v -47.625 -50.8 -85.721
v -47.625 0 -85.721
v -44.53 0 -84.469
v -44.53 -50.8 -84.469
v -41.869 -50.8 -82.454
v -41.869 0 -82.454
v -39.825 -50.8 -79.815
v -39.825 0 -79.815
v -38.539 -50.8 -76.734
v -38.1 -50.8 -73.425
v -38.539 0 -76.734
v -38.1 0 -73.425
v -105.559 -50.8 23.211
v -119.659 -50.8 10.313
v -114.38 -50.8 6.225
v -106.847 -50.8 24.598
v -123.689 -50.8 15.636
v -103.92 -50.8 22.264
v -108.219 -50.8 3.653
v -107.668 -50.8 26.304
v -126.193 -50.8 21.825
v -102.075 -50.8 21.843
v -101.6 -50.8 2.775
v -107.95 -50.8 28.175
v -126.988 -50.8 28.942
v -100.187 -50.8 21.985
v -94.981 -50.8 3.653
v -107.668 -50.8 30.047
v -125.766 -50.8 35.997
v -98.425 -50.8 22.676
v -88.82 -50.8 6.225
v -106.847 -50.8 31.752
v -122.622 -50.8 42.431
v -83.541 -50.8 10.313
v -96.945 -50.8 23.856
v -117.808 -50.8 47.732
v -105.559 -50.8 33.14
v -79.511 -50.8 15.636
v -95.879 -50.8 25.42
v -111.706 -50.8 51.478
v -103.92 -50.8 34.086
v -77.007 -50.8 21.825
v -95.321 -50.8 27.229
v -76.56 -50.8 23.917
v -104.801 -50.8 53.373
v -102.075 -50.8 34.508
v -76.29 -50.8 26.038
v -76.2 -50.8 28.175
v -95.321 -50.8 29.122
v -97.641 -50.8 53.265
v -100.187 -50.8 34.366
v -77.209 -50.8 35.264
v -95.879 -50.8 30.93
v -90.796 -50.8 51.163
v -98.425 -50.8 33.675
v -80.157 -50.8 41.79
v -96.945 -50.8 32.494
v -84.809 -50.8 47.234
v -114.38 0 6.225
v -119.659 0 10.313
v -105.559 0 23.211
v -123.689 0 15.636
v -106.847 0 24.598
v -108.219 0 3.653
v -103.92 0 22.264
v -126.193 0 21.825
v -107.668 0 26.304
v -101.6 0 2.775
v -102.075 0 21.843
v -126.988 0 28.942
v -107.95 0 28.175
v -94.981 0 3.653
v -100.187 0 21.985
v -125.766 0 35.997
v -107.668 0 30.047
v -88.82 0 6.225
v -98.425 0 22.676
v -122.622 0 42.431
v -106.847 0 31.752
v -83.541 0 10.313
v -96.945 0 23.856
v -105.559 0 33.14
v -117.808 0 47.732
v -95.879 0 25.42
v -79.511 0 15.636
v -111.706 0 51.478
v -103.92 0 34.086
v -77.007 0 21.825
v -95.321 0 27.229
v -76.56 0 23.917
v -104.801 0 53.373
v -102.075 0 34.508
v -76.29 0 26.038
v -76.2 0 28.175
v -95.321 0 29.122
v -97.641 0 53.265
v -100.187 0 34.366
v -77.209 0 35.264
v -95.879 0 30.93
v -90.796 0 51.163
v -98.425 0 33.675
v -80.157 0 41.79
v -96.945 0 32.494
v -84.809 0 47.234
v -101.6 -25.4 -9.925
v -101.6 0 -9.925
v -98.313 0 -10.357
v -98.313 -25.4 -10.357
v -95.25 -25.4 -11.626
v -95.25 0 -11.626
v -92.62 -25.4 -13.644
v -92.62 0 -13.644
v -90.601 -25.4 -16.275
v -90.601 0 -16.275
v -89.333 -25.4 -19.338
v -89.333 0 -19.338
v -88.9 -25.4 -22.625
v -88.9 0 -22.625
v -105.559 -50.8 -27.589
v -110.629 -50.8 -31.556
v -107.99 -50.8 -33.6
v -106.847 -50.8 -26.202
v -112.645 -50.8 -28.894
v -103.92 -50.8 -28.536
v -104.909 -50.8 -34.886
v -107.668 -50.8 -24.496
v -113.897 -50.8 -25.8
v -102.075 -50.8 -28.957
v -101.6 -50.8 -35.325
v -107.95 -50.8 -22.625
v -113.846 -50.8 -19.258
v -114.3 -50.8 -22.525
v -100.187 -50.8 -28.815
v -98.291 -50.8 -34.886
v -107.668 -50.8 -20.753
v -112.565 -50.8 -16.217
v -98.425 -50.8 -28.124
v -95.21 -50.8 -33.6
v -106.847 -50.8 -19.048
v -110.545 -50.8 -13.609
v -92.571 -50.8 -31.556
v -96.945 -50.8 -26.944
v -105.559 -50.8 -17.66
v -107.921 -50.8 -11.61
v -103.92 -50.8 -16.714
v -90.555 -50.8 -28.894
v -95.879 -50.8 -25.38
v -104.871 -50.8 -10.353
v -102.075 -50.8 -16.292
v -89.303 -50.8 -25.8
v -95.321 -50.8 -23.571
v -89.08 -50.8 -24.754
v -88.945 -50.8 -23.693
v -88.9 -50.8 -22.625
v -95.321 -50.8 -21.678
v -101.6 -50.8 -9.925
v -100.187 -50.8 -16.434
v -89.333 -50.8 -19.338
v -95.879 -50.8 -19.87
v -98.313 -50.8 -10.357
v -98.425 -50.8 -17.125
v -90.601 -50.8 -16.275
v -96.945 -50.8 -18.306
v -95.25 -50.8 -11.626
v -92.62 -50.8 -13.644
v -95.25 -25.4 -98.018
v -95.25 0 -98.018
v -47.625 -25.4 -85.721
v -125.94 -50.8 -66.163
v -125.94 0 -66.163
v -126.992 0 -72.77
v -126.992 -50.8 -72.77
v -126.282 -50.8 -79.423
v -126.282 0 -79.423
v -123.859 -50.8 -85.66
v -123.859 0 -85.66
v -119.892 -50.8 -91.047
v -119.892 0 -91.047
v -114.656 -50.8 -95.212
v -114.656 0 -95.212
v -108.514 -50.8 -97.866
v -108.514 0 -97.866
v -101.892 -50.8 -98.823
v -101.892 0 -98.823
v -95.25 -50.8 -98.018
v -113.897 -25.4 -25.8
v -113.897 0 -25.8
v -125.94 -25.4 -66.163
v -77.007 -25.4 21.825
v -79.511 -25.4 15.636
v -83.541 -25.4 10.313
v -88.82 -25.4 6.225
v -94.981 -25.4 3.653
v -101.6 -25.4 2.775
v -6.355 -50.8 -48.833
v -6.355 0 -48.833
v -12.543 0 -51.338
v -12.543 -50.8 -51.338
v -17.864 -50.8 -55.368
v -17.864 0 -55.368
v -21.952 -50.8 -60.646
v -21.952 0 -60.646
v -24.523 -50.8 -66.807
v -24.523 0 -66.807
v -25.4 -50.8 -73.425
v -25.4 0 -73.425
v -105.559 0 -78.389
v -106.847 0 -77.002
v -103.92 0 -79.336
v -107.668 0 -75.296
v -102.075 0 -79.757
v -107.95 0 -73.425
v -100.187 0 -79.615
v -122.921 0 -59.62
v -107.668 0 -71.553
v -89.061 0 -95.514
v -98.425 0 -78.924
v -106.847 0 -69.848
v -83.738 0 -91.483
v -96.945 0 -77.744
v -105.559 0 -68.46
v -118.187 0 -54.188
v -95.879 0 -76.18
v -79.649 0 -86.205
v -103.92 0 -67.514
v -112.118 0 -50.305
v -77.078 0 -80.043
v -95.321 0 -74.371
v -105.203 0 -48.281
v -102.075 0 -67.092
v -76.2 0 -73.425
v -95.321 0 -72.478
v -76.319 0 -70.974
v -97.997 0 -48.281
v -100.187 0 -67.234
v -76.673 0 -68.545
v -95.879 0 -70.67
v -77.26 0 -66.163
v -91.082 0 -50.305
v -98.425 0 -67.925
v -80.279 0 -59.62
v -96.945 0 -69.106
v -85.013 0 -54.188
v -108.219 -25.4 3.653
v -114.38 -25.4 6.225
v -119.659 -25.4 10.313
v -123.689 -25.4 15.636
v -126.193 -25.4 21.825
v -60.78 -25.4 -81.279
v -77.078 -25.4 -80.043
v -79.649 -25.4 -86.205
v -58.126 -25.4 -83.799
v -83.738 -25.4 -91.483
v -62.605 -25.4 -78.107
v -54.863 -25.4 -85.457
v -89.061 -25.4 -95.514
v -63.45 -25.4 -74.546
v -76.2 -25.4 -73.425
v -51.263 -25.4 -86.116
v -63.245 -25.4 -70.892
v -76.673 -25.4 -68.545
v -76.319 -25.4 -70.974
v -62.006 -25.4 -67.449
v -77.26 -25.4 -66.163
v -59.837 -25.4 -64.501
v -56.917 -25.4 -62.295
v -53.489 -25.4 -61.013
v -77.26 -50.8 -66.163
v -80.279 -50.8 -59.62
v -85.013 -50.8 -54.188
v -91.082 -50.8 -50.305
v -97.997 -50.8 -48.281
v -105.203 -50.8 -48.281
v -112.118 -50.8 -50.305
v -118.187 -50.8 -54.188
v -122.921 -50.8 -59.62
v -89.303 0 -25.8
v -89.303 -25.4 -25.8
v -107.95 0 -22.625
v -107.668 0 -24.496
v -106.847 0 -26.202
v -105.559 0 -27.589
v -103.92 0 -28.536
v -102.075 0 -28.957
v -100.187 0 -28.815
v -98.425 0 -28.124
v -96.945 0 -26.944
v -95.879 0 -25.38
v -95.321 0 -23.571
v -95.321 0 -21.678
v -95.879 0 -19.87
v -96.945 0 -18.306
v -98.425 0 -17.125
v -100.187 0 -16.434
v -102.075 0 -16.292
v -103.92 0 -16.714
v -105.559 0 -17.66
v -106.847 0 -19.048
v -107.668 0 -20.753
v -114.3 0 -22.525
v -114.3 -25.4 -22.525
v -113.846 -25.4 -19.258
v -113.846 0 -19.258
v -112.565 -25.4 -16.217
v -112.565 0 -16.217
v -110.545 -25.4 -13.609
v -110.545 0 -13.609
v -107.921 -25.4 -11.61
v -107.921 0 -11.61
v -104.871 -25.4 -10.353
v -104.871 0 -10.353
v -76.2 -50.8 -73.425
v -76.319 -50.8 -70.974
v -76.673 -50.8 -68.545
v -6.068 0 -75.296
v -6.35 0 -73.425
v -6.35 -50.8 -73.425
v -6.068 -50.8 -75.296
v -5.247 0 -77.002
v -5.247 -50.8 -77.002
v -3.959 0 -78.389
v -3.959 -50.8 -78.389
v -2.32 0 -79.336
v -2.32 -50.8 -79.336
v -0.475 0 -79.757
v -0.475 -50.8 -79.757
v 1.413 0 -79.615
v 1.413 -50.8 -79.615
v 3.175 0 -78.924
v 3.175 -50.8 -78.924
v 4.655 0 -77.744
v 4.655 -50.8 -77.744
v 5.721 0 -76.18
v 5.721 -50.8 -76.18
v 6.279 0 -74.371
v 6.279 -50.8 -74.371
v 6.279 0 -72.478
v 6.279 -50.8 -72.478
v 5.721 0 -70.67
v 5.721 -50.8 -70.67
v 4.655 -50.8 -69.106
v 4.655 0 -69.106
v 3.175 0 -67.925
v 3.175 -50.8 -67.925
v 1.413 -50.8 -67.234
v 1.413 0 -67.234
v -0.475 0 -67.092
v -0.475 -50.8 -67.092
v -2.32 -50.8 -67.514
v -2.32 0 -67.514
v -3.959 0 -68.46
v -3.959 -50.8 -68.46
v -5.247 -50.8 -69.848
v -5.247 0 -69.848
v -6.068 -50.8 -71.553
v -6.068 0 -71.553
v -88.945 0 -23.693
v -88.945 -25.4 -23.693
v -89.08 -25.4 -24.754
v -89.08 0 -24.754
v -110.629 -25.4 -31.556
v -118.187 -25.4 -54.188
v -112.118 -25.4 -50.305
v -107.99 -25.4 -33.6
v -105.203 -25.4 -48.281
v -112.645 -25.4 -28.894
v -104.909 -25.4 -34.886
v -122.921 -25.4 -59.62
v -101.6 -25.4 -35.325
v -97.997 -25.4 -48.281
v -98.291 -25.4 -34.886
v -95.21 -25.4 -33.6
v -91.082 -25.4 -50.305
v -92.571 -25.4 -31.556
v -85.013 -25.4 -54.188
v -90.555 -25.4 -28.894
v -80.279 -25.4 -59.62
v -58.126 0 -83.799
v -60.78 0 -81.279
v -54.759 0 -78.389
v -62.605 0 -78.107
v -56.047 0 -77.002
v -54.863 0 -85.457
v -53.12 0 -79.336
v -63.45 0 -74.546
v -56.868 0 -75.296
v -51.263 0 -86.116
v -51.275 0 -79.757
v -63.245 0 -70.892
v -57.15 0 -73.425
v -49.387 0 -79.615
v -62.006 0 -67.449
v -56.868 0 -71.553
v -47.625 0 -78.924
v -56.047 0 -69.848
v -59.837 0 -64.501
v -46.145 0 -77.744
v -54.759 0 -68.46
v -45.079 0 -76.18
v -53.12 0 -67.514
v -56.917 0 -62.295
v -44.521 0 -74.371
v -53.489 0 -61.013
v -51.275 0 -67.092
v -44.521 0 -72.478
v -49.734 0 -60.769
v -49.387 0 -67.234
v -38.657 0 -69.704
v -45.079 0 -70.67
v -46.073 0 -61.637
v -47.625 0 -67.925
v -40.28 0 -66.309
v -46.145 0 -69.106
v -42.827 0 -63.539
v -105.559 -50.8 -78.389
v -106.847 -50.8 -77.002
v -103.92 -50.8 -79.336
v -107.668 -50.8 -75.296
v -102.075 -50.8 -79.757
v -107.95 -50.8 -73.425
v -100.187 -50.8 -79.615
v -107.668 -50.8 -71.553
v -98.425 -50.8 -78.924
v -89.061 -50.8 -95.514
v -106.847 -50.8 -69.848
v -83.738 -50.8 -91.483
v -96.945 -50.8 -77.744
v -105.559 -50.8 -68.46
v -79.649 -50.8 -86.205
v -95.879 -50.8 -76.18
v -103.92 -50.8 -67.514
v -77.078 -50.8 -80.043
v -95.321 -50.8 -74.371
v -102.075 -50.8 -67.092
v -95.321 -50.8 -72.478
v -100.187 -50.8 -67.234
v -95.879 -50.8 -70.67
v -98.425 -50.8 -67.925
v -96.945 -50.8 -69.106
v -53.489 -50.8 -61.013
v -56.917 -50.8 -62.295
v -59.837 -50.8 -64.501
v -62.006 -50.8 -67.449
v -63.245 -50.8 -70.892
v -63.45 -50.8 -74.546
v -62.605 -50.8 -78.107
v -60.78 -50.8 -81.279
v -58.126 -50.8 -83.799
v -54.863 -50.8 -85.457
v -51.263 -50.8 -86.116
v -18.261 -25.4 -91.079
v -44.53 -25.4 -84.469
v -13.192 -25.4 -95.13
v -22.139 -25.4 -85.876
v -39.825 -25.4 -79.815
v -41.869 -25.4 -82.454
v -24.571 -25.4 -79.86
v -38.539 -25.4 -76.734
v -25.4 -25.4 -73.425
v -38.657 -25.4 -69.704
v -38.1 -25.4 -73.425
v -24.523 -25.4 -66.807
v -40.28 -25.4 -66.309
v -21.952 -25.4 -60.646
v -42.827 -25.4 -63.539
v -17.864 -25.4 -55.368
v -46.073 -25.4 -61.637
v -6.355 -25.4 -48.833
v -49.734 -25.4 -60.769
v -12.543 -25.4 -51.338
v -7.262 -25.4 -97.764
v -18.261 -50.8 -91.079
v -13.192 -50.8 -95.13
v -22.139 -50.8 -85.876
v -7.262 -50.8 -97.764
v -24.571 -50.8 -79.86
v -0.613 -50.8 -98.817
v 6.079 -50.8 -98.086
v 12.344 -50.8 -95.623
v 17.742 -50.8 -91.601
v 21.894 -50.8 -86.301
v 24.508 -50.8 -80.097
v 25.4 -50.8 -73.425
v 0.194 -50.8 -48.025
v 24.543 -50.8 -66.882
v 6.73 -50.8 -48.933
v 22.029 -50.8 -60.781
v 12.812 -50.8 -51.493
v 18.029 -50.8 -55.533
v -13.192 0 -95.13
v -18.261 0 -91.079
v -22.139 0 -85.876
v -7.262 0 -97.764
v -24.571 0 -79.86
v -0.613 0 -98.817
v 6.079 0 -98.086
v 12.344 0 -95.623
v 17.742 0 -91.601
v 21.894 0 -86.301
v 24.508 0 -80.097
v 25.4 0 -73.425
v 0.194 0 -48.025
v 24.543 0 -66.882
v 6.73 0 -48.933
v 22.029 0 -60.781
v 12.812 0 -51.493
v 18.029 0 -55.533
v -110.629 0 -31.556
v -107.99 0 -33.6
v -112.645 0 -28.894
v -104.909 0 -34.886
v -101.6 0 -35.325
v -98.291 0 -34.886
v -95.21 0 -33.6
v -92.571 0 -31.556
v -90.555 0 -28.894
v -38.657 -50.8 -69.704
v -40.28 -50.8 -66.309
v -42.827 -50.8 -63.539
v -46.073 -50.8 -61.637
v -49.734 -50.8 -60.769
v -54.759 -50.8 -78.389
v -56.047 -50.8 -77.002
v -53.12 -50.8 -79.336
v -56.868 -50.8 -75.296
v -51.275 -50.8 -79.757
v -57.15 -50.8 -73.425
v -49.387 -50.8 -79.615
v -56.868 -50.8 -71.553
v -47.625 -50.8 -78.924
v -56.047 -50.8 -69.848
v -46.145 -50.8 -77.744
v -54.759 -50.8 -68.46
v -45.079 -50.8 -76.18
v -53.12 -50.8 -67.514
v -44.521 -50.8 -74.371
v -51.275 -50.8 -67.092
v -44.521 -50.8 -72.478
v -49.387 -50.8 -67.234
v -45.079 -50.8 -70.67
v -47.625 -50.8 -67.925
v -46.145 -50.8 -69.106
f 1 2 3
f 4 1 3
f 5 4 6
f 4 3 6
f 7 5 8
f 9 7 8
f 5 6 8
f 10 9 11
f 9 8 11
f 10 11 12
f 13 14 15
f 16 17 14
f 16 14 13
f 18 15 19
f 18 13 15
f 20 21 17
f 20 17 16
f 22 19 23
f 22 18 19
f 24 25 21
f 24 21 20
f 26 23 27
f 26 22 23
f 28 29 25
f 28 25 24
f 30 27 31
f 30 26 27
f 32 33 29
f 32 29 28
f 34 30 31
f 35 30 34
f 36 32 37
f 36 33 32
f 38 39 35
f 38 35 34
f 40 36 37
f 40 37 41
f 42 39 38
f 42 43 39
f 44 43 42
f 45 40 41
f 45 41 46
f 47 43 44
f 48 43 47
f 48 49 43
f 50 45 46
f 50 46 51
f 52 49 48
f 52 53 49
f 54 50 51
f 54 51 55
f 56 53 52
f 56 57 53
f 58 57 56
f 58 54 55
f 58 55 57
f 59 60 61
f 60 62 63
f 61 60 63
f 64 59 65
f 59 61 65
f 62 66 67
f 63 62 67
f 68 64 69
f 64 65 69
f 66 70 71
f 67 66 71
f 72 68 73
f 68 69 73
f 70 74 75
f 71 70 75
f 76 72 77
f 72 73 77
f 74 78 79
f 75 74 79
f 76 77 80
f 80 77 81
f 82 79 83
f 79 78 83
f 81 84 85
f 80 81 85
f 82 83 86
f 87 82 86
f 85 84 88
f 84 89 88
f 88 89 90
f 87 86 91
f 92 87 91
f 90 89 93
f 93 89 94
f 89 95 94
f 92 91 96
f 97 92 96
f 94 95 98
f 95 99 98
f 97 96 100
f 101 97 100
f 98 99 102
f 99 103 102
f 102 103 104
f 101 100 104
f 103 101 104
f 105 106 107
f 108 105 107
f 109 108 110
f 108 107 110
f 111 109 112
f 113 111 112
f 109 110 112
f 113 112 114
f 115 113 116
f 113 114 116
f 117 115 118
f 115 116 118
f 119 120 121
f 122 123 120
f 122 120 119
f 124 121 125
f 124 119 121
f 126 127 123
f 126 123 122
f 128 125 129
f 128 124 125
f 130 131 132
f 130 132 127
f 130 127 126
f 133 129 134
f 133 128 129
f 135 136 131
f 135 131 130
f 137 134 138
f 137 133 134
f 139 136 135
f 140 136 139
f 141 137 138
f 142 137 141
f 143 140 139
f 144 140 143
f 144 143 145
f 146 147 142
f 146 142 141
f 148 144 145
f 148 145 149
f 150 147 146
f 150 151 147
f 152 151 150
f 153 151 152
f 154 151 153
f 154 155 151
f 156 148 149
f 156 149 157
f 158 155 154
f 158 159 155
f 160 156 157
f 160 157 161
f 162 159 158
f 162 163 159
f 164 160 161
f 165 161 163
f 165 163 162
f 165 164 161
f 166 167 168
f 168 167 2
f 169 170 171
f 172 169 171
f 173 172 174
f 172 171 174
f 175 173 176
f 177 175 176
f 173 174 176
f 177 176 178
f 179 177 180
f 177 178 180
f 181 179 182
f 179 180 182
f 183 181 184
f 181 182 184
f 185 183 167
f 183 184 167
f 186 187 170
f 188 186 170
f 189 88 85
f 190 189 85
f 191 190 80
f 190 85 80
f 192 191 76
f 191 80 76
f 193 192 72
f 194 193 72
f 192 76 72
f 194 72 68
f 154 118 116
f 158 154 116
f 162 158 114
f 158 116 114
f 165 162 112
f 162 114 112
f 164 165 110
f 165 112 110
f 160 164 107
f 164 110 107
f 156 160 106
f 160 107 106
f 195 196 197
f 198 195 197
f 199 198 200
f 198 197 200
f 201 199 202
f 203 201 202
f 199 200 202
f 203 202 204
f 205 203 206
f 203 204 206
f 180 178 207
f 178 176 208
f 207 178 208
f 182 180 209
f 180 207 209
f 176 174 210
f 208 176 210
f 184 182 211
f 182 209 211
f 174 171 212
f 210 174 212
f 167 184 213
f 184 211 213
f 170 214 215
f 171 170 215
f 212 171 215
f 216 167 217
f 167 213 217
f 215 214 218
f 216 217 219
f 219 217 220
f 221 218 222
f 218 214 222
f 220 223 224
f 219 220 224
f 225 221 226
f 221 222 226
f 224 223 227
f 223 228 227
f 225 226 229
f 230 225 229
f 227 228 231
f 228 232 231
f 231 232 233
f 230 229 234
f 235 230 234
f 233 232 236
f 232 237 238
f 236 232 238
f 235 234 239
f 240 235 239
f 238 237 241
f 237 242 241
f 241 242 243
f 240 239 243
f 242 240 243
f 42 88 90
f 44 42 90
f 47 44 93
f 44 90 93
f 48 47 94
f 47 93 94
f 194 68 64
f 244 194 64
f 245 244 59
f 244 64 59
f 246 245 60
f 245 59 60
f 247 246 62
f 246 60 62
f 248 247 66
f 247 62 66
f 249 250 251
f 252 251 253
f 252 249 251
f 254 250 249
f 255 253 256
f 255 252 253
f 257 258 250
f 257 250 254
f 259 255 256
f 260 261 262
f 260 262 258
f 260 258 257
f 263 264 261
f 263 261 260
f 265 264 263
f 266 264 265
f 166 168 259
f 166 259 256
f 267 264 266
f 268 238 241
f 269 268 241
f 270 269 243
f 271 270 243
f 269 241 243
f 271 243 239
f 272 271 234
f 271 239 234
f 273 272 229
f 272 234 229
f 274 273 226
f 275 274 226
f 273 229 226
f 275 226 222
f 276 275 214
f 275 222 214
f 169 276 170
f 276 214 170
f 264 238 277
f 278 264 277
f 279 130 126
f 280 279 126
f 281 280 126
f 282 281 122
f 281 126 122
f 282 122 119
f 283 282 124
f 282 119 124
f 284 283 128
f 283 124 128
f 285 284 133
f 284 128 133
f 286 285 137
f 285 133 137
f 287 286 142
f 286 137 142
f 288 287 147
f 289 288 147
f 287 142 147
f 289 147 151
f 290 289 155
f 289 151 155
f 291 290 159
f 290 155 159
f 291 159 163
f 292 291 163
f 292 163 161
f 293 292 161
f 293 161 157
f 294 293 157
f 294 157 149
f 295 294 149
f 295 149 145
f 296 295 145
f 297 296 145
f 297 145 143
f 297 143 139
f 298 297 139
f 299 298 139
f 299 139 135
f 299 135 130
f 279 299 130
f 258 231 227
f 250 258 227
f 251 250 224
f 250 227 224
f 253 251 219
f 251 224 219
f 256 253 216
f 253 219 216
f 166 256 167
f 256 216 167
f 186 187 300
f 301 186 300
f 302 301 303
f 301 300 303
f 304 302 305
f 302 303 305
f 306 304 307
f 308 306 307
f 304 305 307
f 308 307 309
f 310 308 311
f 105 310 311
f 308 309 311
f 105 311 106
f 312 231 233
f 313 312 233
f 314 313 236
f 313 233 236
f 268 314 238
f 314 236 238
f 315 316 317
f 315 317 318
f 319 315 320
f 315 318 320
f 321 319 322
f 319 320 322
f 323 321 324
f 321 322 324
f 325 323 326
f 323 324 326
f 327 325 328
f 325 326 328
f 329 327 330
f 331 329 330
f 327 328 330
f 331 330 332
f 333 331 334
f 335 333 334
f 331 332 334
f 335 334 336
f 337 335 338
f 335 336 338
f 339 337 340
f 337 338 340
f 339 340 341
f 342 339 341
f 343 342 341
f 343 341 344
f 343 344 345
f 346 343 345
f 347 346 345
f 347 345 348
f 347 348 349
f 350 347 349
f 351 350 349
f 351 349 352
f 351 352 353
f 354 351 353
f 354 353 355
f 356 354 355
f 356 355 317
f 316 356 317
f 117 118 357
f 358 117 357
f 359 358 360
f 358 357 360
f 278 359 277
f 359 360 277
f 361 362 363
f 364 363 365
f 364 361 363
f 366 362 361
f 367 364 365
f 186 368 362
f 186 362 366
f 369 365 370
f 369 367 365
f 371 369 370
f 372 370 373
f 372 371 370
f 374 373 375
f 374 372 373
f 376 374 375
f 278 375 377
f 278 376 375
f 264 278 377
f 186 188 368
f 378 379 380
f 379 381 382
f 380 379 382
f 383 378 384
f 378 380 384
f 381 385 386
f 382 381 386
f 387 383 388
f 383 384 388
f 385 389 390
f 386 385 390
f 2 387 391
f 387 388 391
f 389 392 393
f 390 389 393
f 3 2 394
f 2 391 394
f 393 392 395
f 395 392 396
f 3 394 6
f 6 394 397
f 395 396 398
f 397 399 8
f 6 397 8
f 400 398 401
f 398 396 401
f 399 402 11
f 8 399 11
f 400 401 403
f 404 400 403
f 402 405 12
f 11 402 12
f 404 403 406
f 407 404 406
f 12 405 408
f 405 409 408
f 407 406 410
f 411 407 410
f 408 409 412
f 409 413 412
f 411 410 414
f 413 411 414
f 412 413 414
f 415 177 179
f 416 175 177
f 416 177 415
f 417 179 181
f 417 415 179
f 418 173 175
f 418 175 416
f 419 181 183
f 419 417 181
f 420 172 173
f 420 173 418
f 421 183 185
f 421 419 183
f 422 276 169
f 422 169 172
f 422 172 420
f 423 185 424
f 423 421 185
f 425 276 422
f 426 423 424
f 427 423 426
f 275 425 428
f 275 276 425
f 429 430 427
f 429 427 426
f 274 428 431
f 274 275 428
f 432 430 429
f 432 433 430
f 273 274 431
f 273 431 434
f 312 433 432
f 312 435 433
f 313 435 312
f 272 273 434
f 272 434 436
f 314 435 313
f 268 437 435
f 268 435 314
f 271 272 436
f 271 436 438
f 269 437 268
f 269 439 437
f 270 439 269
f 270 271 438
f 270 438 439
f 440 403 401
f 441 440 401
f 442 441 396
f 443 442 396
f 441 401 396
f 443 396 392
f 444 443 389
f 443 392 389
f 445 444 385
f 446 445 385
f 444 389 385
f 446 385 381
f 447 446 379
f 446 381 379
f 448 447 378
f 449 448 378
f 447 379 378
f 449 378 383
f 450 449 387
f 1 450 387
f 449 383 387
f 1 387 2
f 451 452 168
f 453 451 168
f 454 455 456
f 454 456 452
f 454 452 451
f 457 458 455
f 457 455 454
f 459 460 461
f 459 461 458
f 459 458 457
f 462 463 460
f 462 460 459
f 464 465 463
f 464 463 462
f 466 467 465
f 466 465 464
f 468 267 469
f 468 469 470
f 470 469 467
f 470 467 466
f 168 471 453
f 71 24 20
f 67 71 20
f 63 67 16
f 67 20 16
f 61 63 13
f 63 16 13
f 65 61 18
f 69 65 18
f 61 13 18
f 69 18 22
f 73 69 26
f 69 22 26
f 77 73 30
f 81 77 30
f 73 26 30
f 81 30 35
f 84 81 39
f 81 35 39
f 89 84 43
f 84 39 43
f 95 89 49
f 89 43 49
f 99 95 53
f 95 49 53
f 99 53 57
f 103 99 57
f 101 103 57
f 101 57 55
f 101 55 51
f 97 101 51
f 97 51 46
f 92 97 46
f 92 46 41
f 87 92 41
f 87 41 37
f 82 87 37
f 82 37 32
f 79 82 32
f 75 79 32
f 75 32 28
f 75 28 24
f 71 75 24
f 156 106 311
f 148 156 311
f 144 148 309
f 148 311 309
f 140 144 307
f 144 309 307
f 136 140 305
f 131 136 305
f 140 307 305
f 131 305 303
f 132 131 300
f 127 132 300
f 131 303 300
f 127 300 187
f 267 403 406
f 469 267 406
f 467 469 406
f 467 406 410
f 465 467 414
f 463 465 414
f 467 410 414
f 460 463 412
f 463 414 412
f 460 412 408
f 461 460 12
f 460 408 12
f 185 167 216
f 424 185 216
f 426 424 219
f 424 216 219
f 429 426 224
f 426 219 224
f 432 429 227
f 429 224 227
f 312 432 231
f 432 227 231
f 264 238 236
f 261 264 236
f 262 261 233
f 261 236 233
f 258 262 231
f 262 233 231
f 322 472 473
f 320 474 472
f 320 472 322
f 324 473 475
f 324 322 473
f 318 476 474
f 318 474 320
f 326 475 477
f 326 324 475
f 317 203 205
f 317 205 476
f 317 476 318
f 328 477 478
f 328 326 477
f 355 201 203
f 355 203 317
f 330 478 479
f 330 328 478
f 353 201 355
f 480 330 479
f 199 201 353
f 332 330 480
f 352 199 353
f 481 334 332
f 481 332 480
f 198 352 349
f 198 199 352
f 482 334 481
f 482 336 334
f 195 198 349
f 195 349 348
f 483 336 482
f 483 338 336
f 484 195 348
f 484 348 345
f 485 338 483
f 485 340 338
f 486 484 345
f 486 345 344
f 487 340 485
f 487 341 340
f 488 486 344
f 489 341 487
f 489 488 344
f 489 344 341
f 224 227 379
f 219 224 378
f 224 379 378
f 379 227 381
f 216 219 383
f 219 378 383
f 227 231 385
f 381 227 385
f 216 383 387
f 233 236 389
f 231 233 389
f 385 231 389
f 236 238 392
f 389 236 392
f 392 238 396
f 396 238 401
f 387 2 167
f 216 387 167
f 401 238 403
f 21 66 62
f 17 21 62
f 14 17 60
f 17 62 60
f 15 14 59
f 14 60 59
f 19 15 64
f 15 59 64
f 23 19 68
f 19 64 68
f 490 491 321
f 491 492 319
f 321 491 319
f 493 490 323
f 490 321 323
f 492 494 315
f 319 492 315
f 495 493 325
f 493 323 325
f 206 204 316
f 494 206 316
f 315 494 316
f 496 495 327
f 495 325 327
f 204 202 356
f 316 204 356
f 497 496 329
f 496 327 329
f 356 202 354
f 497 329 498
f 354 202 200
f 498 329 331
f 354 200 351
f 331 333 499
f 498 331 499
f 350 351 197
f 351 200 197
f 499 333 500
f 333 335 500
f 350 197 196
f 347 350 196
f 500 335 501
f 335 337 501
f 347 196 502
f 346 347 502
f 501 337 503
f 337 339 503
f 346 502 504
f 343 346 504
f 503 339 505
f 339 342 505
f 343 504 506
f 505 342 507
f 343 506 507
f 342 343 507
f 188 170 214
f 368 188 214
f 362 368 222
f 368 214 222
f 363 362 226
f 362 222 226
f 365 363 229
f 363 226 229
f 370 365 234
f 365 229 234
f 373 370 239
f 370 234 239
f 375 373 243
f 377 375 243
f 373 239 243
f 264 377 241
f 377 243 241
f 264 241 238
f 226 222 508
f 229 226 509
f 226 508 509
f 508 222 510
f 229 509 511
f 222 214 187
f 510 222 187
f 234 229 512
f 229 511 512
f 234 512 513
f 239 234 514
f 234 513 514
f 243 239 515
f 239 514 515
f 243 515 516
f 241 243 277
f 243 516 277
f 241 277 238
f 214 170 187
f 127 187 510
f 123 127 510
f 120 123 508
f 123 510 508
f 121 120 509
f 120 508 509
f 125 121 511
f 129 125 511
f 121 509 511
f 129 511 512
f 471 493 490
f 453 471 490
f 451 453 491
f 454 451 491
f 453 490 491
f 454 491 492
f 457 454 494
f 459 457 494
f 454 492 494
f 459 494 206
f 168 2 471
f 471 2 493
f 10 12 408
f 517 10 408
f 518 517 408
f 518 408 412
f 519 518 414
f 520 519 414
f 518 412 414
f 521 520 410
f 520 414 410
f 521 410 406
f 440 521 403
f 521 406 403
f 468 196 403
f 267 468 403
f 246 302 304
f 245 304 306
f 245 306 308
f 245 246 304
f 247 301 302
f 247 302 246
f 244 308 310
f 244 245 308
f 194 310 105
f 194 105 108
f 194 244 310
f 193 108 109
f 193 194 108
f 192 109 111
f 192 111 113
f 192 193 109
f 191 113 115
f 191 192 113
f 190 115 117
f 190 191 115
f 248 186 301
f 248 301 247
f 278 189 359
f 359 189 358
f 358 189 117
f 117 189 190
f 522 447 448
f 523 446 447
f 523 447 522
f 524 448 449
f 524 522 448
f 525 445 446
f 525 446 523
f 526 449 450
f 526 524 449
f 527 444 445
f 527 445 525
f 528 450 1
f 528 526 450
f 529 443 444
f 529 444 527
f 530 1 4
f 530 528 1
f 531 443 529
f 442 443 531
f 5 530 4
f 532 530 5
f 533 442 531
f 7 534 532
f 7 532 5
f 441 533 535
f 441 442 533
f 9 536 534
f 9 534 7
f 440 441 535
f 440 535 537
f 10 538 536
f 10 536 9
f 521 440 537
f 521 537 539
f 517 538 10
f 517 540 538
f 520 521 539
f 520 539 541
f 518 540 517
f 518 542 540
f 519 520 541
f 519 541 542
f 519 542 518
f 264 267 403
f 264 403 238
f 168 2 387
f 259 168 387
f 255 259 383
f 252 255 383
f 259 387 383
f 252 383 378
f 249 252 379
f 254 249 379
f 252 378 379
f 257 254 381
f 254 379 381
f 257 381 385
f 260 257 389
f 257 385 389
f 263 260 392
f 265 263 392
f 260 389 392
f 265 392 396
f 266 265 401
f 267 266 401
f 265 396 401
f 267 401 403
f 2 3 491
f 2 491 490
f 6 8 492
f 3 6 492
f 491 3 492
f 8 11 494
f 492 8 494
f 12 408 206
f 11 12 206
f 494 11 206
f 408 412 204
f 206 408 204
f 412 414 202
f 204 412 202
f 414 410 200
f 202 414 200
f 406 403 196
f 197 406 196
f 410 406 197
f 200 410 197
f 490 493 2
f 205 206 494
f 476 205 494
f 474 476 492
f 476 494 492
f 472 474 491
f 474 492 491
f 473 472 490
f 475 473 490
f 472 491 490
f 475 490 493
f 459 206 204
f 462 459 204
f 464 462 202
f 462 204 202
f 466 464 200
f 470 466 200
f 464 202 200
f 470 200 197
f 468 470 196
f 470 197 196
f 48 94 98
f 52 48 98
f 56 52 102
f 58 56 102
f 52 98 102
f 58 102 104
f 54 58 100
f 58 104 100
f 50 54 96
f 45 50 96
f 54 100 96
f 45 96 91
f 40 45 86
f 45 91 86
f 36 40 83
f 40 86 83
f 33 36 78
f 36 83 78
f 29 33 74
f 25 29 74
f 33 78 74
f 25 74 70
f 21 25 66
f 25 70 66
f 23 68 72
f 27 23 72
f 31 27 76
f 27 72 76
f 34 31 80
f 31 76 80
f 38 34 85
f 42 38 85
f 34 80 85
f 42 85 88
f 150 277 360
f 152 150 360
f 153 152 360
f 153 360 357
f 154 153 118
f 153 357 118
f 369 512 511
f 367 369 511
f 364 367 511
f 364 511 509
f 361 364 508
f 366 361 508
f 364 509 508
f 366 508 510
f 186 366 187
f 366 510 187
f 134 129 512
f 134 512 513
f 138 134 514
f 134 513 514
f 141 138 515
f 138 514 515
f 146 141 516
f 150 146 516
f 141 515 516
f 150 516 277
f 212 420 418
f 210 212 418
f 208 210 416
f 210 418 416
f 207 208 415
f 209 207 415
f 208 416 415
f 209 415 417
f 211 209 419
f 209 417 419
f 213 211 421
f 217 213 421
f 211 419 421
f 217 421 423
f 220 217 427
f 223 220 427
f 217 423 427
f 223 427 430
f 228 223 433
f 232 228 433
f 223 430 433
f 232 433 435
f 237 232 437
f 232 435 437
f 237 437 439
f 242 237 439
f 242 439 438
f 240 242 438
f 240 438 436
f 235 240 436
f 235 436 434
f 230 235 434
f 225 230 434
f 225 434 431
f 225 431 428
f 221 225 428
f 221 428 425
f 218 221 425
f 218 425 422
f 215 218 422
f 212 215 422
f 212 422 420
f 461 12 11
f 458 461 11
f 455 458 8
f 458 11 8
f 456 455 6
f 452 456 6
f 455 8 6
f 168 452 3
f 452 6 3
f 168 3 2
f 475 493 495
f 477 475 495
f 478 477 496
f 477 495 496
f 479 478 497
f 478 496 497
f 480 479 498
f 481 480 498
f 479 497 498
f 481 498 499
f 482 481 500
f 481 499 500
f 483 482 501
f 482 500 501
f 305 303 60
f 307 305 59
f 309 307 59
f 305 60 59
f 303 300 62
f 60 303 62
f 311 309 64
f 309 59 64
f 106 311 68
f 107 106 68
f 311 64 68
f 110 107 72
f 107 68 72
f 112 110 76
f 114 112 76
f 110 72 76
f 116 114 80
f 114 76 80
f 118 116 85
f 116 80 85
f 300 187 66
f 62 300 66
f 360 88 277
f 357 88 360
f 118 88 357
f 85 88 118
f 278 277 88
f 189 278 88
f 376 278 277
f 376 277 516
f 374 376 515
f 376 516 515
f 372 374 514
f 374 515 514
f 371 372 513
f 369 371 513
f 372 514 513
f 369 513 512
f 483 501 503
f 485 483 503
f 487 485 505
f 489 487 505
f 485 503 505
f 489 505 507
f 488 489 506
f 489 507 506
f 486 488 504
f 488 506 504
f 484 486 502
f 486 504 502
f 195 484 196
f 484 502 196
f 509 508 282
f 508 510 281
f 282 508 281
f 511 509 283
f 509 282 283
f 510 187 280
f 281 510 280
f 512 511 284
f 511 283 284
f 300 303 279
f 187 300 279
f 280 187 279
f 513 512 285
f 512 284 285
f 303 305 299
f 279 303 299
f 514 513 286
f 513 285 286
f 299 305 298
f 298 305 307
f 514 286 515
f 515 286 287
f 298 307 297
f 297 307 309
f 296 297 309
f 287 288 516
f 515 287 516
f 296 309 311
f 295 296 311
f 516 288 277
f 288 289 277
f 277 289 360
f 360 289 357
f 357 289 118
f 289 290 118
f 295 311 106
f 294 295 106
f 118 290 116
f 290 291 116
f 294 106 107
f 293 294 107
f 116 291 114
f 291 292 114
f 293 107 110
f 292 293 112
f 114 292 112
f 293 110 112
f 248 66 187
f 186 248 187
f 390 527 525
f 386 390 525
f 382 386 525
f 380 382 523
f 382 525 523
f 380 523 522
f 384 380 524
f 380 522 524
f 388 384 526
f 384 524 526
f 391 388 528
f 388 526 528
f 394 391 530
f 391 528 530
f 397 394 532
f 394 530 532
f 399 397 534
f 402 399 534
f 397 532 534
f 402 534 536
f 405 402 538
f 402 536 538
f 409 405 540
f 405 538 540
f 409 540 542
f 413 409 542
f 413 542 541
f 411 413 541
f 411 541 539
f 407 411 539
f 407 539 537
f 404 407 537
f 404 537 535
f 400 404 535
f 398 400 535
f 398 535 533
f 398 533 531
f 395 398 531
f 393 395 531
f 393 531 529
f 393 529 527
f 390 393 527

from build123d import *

# Parameters (mm, degrees)
F1_DEPTH = 50.8
F2_DEPTH = 25.4
F3_D     = 12.7
F3_2_D   = 12.7
F3_3_D   = 12.7
F3_4_D   = 12.7
F3_5_D   = 12.7


with BuildPart() as f1:
    # F0 (on Front) → F1 (new body)
    with BuildSketch(Plane.XZ):
        with BuildLine():
            ThreePointArc((-101.6, 2.7753140884), (-86.0457401333, 8.0948509463), (-77.0065557516, 21.8253140884))
            ThreePointArc((-77.0065557516, 21.8253140884), (-76.4024457148, 24.9748050593), (-76.2, 28.1753140884))
            ThreePointArc((-76.2, 28.1753140884), (-104.8005090291, 53.3728683735), (-126.1934442484, 21.8253140884))
            ThreePointArc((-126.1934442484, 21.8253140884), (-117.1542598667, 8.0948509463), (-101.6, 2.7753140884))
        make_face()
    extrude(amount=F1_DEPTH)

    # F3 (through all)
    with Locations(Plane(origin=(0, 0, 0), x_dir=(1, 0, 0), z_dir=(0, 1, 0))):
        with Locations((-101.6, -28.1753140884), (-101.6, 22.6246859116), (-101.6, 73.4246859116), (-50.8, 73.4246859116), (0, 73.4246859116)):
            Hole(F3_D / 2)


with BuildPart() as f1b:
    # F0 (on Front) → F1, piece 2 (new body)
    with BuildSketch(Plane.XZ):
        with BuildLine():
            Line((-101.6, -22.6246859116), (-101.6, -35.3246859116))
            ThreePointArc((-101.6, -35.3246859116), (-93.8228700667, -32.6649174827), (-89.3032778758, -25.7996859116))
            ThreePointArc((-89.3032778758, -25.7996859116), (-89.0012228574, -24.2249404262), (-88.9, -22.6246859116))
            ThreePointArc((-88.9, -22.6246859116), (-92.6197438789, -13.6444297906), (-101.6, -9.9246859116))
            Line((-101.6, -9.9246859116), (-101.6, -22.6246859116))
        make_face()
        with BuildLine():
            ThreePointArc((-113.8967221242, -25.7996859116), (-109.3771299333, -32.6649174827), (-101.6, -35.3246859116))
            Line((-101.6, -35.3246859116), (-101.6, -22.6246859116))
            Line((-101.6, -22.6246859116), (-101.6, -9.9246859116))
            ThreePointArc((-101.6, -9.9246859116), (-111.640231571, -14.8475559783), (-113.8967221242, -25.7996859116))
        make_face()
    extrude(amount=F1_DEPTH)

    # F3#2 (through all)
    with Locations(Plane(origin=(0, 0, 0), x_dir=(1, 0, 0), z_dir=(0, 1, 0))):
        with Locations((-101.6, -28.1753140884), (-101.6, 22.6246859116), (-101.6, 73.4246859116), (-50.8, 73.4246859116), (0, 73.4246859116)):
            Hole(F3_2_D / 2)


with BuildPart() as f1c:
    # F0 (on Front) → F1, piece 3 (new body)
    with BuildSketch(Plane.XZ):
        with BuildLine():
            Line((-101.6, -48.0246859116), (-101.6, -73.4246859116))
            Line((-101.6, -73.4246859116), (-76.2, -73.4246859116))
            ThreePointArc((-76.2, -73.4246859116), (-76.4664744784, -69.7550953548), (-77.2603066815, -66.1625010366))
            ThreePointArc((-77.2603066815, -66.1625010366), (-86.4227060354, -53.0578072133), (-101.6, -48.0246859116))
        make_face()
        with BuildLine():
            Line((-76.2, -73.4246859116), (-101.6, -73.4246859116))
            Line((-101.6, -73.4246859116), (-101.6, -48.0246859116))
            ThreePointArc((-101.6, -48.0246859116), (-116.7772939646, -53.0578072133), (-125.9396933185, -66.1625010366))
            ThreePointArc((-125.9396933185, -66.1625010366), (-119.8921443012, -91.0473263739), (-95.25, -98.0181301601))
            ThreePointArc((-95.25, -98.0181301601), (-81.5195368579, -88.9789457783), (-76.2, -73.4246859116))
        make_face()
    extrude(amount=F1_DEPTH)

    # F3#3 (through all)
    with Locations(Plane(origin=(0, 0, 0), x_dir=(1, 0, 0), z_dir=(0, 1, 0))):
        with Locations((-101.6, -28.1753140884), (-101.6, 22.6246859116), (-101.6, 73.4246859116), (-50.8, 73.4246859116), (0, 73.4246859116)):
            Hole(F3_3_D / 2)


with BuildPart() as f1d:
    # F0 (on Front) → F1, piece 4 (new body)
    with BuildSketch(Plane.XZ):
        with BuildLine():
            Line((-50.8, -73.4246859116), (-63.5, -73.4246859116))
            ThreePointArc((-63.5, -73.4246859116), (-58.5771299333, -83.4649174827), (-47.625, -85.7214080358))
            ThreePointArc((-47.625, -85.7214080358), (-40.759768429, -81.201815845), (-38.1, -73.4246859116))
            Line((-38.1, -73.4246859116), (-50.8, -73.4246859116))
        make_face()
        with BuildLine():
            ThreePointArc((-53.4889818221, -61.0126201383), (-60.6853444336, -65.4516083735), (-63.5, -73.4246859116))
            Line((-63.5, -73.4246859116), (-50.8, -73.4246859116))
            Line((-50.8, -73.4246859116), (-38.1, -73.4246859116))
            ThreePointArc((-38.1, -73.4246859116), (-42.8269224618, -63.5393414781), (-53.4889818221, -61.0126201383))
        make_face()
    extrude(amount=F1_DEPTH)

    # F3#4 (through all)
    with Locations(Plane(origin=(0, 0, 0), x_dir=(1, 0, 0), z_dir=(0, 1, 0))):
        with Locations((-101.6, -28.1753140884), (-101.6, 22.6246859116), (-101.6, 73.4246859116), (-50.8, 73.4246859116), (0, 73.4246859116)):
            Hole(F3_4_D / 2)


with BuildPart() as f1e:
    # F0 (on Front) → F1, piece 5 (new body)
    with BuildSketch(Plane.XZ):
        with BuildLine():
            ThreePointArc((25.3999999825, -73.4246859116), (15.5522338839, -53.3426536357), (-6.3549622702, -48.832523468))
            ThreePointArc((-6.3549622702, -48.832523468), (-20.0820322759, -57.8724520278), (-25.3999999825, -73.4246859116))
            ThreePointArc((-25.3999999825, -73.4246859116), (-20.3668788178, -88.6019796865), (-7.2621852984, -97.7643790856))
            ThreePointArc((-7.2621852984, -97.7643790856), (15.1772937749, -93.7915647295), (25.3999999825, -73.4246859116))
        make_face()
    extrude(amount=F1_DEPTH)

    # F3#5 (through all)
    with Locations(Plane(origin=(0, 0, 0), x_dir=(1, 0, 0), z_dir=(0, 1, 0))):
        with Locations((-101.6, -28.1753140884), (-101.6, 22.6246859116), (-101.6, 73.4246859116), (-50.8, 73.4246859116), (0, 73.4246859116)):
            Hole(F3_5_D / 2)


with BuildPart() as f2:
    # F0 (on Front) → F2 (new body)
    with BuildSketch(Plane.XZ):
        with BuildLine():
            Line((-126.1934442484, 21.8253140884), (-113.8967221242, -25.7996859116))
            ThreePointArc((-113.8967221242, -25.7996859116), (-111.640231571, -14.8475559783), (-101.6, -9.9246859116))
            Line((-101.6, -9.9246859116), (-101.6, 2.7753140884))
            ThreePointArc((-101.6, 2.7753140884), (-117.1542598667, 8.0948509463), (-126.1934442484, 21.8253140884))
        make_face()
        with BuildLine():
            ThreePointArc((-88.9, -22.6246859116), (-89.0012228574, -24.2249404262), (-89.3032778758, -25.7996859116))
            Line((-89.3032778758, -25.7996859116), (-77.0065557516, 21.8253140884))
            ThreePointArc((-77.0065557516, 21.8253140884), (-86.0457401333, 8.0948509463), (-101.6, 2.7753140884))
            Line((-101.6, 2.7753140884), (-101.6, -9.9246859116))
            ThreePointArc((-101.6, -9.9246859116), (-92.6197438789, -13.6444297906), (-88.9, -22.6246859116))
        make_face()
    extrude(amount=F2_DEPTH)


with BuildPart() as f2b:
    # F0 (on Front) → F2, piece 2 (new body)
    with BuildSketch(Plane.XZ):
        with BuildLine():
            Line((-101.6, -35.3246859116), (-101.6, -48.0246859116))
            ThreePointArc((-101.6, -48.0246859116), (-86.4227060354, -53.0578072133), (-77.2603066815, -66.1625010366))
            Line((-77.2603066815, -66.1625010366), (-89.3032778758, -25.7996859116))
            ThreePointArc((-89.3032778758, -25.7996859116), (-93.8228700667, -32.6649174827), (-101.6, -35.3246859116))
        make_face()
        with BuildLine():
            ThreePointArc((-125.9396933185, -66.1625010366), (-116.7772939646, -53.0578072133), (-101.6, -48.0246859116))
            Line((-101.6, -48.0246859116), (-101.6, -35.3246859116))
            ThreePointArc((-101.6, -35.3246859116), (-109.3771299333, -32.6649174827), (-113.8967221242, -25.7996859116))
            Line((-113.8967221242, -25.7996859116), (-125.9396933185, -66.1625010366))
        make_face()
    extrude(amount=F2_DEPTH)


with BuildPart() as f2c:
    # F0 (on Front) → F2, piece 3 (new body)
    with BuildSketch(Plane.XZ):
        with BuildLine():
            ThreePointArc((-77.2603066815, -66.1625010366), (-76.4664744784, -69.7550953548), (-76.2, -73.4246859116))
            Line((-76.2, -73.4246859116), (-63.5, -73.4246859116))
            ThreePointArc((-63.5, -73.4246859116), (-60.6853444336, -65.4516083735), (-53.4889818221, -61.0126201383))
            Line((-53.4889818221, -61.0126201383), (-77.2603066815, -66.1625010366))
        make_face()
        with BuildLine():
            Line((-63.5, -73.4246859116), (-76.2, -73.4246859116))
            ThreePointArc((-76.2, -73.4246859116), (-81.5195368579, -88.9789457783), (-95.25, -98.0181301601))
            Line((-95.25, -98.0181301601), (-47.625, -85.7214080358))
            ThreePointArc((-47.625, -85.7214080358), (-58.5771299333, -83.4649174827), (-63.5, -73.4246859116))
        make_face()
    extrude(amount=F2_DEPTH)


with BuildPart() as f2d:
    # F0 (on Front) → F2, piece 4 (new body)
    with BuildSketch(Plane.XZ):
        with BuildLine():
            Line((-6.3549622702, -48.832523468), (-53.4889818221, -61.0126201383))
            ThreePointArc((-53.4889818221, -61.0126201383), (-42.8269224618, -63.5393414781), (-38.1, -73.4246859116))
            Line((-38.1, -73.4246859116), (-25.3999999825, -73.4246859116))
            ThreePointArc((-25.3999999825, -73.4246859116), (-20.0820322759, -57.8724520278), (-6.3549622702, -48.832523468))
        make_face()
        with BuildLine():
            ThreePointArc((-38.1, -73.4246859116), (-40.759768429, -81.201815845), (-47.625, -85.7214080358))
            Line((-47.625, -85.7214080358), (-7.2621852984, -97.7643790856))
            ThreePointArc((-7.2621852984, -97.7643790856), (-20.3668788178, -88.6019796865), (-25.3999999825, -73.4246859116))
            Line((-25.3999999825, -73.4246859116), (-38.1, -73.4246859116))
        make_face()
    extrude(amount=F2_DEPTH)


solid = Compound([f1.part, f1b.part, f1c.part, f1d.part, f1e.part, f2.part, f2b.part, f2c.part, f2d.part])
